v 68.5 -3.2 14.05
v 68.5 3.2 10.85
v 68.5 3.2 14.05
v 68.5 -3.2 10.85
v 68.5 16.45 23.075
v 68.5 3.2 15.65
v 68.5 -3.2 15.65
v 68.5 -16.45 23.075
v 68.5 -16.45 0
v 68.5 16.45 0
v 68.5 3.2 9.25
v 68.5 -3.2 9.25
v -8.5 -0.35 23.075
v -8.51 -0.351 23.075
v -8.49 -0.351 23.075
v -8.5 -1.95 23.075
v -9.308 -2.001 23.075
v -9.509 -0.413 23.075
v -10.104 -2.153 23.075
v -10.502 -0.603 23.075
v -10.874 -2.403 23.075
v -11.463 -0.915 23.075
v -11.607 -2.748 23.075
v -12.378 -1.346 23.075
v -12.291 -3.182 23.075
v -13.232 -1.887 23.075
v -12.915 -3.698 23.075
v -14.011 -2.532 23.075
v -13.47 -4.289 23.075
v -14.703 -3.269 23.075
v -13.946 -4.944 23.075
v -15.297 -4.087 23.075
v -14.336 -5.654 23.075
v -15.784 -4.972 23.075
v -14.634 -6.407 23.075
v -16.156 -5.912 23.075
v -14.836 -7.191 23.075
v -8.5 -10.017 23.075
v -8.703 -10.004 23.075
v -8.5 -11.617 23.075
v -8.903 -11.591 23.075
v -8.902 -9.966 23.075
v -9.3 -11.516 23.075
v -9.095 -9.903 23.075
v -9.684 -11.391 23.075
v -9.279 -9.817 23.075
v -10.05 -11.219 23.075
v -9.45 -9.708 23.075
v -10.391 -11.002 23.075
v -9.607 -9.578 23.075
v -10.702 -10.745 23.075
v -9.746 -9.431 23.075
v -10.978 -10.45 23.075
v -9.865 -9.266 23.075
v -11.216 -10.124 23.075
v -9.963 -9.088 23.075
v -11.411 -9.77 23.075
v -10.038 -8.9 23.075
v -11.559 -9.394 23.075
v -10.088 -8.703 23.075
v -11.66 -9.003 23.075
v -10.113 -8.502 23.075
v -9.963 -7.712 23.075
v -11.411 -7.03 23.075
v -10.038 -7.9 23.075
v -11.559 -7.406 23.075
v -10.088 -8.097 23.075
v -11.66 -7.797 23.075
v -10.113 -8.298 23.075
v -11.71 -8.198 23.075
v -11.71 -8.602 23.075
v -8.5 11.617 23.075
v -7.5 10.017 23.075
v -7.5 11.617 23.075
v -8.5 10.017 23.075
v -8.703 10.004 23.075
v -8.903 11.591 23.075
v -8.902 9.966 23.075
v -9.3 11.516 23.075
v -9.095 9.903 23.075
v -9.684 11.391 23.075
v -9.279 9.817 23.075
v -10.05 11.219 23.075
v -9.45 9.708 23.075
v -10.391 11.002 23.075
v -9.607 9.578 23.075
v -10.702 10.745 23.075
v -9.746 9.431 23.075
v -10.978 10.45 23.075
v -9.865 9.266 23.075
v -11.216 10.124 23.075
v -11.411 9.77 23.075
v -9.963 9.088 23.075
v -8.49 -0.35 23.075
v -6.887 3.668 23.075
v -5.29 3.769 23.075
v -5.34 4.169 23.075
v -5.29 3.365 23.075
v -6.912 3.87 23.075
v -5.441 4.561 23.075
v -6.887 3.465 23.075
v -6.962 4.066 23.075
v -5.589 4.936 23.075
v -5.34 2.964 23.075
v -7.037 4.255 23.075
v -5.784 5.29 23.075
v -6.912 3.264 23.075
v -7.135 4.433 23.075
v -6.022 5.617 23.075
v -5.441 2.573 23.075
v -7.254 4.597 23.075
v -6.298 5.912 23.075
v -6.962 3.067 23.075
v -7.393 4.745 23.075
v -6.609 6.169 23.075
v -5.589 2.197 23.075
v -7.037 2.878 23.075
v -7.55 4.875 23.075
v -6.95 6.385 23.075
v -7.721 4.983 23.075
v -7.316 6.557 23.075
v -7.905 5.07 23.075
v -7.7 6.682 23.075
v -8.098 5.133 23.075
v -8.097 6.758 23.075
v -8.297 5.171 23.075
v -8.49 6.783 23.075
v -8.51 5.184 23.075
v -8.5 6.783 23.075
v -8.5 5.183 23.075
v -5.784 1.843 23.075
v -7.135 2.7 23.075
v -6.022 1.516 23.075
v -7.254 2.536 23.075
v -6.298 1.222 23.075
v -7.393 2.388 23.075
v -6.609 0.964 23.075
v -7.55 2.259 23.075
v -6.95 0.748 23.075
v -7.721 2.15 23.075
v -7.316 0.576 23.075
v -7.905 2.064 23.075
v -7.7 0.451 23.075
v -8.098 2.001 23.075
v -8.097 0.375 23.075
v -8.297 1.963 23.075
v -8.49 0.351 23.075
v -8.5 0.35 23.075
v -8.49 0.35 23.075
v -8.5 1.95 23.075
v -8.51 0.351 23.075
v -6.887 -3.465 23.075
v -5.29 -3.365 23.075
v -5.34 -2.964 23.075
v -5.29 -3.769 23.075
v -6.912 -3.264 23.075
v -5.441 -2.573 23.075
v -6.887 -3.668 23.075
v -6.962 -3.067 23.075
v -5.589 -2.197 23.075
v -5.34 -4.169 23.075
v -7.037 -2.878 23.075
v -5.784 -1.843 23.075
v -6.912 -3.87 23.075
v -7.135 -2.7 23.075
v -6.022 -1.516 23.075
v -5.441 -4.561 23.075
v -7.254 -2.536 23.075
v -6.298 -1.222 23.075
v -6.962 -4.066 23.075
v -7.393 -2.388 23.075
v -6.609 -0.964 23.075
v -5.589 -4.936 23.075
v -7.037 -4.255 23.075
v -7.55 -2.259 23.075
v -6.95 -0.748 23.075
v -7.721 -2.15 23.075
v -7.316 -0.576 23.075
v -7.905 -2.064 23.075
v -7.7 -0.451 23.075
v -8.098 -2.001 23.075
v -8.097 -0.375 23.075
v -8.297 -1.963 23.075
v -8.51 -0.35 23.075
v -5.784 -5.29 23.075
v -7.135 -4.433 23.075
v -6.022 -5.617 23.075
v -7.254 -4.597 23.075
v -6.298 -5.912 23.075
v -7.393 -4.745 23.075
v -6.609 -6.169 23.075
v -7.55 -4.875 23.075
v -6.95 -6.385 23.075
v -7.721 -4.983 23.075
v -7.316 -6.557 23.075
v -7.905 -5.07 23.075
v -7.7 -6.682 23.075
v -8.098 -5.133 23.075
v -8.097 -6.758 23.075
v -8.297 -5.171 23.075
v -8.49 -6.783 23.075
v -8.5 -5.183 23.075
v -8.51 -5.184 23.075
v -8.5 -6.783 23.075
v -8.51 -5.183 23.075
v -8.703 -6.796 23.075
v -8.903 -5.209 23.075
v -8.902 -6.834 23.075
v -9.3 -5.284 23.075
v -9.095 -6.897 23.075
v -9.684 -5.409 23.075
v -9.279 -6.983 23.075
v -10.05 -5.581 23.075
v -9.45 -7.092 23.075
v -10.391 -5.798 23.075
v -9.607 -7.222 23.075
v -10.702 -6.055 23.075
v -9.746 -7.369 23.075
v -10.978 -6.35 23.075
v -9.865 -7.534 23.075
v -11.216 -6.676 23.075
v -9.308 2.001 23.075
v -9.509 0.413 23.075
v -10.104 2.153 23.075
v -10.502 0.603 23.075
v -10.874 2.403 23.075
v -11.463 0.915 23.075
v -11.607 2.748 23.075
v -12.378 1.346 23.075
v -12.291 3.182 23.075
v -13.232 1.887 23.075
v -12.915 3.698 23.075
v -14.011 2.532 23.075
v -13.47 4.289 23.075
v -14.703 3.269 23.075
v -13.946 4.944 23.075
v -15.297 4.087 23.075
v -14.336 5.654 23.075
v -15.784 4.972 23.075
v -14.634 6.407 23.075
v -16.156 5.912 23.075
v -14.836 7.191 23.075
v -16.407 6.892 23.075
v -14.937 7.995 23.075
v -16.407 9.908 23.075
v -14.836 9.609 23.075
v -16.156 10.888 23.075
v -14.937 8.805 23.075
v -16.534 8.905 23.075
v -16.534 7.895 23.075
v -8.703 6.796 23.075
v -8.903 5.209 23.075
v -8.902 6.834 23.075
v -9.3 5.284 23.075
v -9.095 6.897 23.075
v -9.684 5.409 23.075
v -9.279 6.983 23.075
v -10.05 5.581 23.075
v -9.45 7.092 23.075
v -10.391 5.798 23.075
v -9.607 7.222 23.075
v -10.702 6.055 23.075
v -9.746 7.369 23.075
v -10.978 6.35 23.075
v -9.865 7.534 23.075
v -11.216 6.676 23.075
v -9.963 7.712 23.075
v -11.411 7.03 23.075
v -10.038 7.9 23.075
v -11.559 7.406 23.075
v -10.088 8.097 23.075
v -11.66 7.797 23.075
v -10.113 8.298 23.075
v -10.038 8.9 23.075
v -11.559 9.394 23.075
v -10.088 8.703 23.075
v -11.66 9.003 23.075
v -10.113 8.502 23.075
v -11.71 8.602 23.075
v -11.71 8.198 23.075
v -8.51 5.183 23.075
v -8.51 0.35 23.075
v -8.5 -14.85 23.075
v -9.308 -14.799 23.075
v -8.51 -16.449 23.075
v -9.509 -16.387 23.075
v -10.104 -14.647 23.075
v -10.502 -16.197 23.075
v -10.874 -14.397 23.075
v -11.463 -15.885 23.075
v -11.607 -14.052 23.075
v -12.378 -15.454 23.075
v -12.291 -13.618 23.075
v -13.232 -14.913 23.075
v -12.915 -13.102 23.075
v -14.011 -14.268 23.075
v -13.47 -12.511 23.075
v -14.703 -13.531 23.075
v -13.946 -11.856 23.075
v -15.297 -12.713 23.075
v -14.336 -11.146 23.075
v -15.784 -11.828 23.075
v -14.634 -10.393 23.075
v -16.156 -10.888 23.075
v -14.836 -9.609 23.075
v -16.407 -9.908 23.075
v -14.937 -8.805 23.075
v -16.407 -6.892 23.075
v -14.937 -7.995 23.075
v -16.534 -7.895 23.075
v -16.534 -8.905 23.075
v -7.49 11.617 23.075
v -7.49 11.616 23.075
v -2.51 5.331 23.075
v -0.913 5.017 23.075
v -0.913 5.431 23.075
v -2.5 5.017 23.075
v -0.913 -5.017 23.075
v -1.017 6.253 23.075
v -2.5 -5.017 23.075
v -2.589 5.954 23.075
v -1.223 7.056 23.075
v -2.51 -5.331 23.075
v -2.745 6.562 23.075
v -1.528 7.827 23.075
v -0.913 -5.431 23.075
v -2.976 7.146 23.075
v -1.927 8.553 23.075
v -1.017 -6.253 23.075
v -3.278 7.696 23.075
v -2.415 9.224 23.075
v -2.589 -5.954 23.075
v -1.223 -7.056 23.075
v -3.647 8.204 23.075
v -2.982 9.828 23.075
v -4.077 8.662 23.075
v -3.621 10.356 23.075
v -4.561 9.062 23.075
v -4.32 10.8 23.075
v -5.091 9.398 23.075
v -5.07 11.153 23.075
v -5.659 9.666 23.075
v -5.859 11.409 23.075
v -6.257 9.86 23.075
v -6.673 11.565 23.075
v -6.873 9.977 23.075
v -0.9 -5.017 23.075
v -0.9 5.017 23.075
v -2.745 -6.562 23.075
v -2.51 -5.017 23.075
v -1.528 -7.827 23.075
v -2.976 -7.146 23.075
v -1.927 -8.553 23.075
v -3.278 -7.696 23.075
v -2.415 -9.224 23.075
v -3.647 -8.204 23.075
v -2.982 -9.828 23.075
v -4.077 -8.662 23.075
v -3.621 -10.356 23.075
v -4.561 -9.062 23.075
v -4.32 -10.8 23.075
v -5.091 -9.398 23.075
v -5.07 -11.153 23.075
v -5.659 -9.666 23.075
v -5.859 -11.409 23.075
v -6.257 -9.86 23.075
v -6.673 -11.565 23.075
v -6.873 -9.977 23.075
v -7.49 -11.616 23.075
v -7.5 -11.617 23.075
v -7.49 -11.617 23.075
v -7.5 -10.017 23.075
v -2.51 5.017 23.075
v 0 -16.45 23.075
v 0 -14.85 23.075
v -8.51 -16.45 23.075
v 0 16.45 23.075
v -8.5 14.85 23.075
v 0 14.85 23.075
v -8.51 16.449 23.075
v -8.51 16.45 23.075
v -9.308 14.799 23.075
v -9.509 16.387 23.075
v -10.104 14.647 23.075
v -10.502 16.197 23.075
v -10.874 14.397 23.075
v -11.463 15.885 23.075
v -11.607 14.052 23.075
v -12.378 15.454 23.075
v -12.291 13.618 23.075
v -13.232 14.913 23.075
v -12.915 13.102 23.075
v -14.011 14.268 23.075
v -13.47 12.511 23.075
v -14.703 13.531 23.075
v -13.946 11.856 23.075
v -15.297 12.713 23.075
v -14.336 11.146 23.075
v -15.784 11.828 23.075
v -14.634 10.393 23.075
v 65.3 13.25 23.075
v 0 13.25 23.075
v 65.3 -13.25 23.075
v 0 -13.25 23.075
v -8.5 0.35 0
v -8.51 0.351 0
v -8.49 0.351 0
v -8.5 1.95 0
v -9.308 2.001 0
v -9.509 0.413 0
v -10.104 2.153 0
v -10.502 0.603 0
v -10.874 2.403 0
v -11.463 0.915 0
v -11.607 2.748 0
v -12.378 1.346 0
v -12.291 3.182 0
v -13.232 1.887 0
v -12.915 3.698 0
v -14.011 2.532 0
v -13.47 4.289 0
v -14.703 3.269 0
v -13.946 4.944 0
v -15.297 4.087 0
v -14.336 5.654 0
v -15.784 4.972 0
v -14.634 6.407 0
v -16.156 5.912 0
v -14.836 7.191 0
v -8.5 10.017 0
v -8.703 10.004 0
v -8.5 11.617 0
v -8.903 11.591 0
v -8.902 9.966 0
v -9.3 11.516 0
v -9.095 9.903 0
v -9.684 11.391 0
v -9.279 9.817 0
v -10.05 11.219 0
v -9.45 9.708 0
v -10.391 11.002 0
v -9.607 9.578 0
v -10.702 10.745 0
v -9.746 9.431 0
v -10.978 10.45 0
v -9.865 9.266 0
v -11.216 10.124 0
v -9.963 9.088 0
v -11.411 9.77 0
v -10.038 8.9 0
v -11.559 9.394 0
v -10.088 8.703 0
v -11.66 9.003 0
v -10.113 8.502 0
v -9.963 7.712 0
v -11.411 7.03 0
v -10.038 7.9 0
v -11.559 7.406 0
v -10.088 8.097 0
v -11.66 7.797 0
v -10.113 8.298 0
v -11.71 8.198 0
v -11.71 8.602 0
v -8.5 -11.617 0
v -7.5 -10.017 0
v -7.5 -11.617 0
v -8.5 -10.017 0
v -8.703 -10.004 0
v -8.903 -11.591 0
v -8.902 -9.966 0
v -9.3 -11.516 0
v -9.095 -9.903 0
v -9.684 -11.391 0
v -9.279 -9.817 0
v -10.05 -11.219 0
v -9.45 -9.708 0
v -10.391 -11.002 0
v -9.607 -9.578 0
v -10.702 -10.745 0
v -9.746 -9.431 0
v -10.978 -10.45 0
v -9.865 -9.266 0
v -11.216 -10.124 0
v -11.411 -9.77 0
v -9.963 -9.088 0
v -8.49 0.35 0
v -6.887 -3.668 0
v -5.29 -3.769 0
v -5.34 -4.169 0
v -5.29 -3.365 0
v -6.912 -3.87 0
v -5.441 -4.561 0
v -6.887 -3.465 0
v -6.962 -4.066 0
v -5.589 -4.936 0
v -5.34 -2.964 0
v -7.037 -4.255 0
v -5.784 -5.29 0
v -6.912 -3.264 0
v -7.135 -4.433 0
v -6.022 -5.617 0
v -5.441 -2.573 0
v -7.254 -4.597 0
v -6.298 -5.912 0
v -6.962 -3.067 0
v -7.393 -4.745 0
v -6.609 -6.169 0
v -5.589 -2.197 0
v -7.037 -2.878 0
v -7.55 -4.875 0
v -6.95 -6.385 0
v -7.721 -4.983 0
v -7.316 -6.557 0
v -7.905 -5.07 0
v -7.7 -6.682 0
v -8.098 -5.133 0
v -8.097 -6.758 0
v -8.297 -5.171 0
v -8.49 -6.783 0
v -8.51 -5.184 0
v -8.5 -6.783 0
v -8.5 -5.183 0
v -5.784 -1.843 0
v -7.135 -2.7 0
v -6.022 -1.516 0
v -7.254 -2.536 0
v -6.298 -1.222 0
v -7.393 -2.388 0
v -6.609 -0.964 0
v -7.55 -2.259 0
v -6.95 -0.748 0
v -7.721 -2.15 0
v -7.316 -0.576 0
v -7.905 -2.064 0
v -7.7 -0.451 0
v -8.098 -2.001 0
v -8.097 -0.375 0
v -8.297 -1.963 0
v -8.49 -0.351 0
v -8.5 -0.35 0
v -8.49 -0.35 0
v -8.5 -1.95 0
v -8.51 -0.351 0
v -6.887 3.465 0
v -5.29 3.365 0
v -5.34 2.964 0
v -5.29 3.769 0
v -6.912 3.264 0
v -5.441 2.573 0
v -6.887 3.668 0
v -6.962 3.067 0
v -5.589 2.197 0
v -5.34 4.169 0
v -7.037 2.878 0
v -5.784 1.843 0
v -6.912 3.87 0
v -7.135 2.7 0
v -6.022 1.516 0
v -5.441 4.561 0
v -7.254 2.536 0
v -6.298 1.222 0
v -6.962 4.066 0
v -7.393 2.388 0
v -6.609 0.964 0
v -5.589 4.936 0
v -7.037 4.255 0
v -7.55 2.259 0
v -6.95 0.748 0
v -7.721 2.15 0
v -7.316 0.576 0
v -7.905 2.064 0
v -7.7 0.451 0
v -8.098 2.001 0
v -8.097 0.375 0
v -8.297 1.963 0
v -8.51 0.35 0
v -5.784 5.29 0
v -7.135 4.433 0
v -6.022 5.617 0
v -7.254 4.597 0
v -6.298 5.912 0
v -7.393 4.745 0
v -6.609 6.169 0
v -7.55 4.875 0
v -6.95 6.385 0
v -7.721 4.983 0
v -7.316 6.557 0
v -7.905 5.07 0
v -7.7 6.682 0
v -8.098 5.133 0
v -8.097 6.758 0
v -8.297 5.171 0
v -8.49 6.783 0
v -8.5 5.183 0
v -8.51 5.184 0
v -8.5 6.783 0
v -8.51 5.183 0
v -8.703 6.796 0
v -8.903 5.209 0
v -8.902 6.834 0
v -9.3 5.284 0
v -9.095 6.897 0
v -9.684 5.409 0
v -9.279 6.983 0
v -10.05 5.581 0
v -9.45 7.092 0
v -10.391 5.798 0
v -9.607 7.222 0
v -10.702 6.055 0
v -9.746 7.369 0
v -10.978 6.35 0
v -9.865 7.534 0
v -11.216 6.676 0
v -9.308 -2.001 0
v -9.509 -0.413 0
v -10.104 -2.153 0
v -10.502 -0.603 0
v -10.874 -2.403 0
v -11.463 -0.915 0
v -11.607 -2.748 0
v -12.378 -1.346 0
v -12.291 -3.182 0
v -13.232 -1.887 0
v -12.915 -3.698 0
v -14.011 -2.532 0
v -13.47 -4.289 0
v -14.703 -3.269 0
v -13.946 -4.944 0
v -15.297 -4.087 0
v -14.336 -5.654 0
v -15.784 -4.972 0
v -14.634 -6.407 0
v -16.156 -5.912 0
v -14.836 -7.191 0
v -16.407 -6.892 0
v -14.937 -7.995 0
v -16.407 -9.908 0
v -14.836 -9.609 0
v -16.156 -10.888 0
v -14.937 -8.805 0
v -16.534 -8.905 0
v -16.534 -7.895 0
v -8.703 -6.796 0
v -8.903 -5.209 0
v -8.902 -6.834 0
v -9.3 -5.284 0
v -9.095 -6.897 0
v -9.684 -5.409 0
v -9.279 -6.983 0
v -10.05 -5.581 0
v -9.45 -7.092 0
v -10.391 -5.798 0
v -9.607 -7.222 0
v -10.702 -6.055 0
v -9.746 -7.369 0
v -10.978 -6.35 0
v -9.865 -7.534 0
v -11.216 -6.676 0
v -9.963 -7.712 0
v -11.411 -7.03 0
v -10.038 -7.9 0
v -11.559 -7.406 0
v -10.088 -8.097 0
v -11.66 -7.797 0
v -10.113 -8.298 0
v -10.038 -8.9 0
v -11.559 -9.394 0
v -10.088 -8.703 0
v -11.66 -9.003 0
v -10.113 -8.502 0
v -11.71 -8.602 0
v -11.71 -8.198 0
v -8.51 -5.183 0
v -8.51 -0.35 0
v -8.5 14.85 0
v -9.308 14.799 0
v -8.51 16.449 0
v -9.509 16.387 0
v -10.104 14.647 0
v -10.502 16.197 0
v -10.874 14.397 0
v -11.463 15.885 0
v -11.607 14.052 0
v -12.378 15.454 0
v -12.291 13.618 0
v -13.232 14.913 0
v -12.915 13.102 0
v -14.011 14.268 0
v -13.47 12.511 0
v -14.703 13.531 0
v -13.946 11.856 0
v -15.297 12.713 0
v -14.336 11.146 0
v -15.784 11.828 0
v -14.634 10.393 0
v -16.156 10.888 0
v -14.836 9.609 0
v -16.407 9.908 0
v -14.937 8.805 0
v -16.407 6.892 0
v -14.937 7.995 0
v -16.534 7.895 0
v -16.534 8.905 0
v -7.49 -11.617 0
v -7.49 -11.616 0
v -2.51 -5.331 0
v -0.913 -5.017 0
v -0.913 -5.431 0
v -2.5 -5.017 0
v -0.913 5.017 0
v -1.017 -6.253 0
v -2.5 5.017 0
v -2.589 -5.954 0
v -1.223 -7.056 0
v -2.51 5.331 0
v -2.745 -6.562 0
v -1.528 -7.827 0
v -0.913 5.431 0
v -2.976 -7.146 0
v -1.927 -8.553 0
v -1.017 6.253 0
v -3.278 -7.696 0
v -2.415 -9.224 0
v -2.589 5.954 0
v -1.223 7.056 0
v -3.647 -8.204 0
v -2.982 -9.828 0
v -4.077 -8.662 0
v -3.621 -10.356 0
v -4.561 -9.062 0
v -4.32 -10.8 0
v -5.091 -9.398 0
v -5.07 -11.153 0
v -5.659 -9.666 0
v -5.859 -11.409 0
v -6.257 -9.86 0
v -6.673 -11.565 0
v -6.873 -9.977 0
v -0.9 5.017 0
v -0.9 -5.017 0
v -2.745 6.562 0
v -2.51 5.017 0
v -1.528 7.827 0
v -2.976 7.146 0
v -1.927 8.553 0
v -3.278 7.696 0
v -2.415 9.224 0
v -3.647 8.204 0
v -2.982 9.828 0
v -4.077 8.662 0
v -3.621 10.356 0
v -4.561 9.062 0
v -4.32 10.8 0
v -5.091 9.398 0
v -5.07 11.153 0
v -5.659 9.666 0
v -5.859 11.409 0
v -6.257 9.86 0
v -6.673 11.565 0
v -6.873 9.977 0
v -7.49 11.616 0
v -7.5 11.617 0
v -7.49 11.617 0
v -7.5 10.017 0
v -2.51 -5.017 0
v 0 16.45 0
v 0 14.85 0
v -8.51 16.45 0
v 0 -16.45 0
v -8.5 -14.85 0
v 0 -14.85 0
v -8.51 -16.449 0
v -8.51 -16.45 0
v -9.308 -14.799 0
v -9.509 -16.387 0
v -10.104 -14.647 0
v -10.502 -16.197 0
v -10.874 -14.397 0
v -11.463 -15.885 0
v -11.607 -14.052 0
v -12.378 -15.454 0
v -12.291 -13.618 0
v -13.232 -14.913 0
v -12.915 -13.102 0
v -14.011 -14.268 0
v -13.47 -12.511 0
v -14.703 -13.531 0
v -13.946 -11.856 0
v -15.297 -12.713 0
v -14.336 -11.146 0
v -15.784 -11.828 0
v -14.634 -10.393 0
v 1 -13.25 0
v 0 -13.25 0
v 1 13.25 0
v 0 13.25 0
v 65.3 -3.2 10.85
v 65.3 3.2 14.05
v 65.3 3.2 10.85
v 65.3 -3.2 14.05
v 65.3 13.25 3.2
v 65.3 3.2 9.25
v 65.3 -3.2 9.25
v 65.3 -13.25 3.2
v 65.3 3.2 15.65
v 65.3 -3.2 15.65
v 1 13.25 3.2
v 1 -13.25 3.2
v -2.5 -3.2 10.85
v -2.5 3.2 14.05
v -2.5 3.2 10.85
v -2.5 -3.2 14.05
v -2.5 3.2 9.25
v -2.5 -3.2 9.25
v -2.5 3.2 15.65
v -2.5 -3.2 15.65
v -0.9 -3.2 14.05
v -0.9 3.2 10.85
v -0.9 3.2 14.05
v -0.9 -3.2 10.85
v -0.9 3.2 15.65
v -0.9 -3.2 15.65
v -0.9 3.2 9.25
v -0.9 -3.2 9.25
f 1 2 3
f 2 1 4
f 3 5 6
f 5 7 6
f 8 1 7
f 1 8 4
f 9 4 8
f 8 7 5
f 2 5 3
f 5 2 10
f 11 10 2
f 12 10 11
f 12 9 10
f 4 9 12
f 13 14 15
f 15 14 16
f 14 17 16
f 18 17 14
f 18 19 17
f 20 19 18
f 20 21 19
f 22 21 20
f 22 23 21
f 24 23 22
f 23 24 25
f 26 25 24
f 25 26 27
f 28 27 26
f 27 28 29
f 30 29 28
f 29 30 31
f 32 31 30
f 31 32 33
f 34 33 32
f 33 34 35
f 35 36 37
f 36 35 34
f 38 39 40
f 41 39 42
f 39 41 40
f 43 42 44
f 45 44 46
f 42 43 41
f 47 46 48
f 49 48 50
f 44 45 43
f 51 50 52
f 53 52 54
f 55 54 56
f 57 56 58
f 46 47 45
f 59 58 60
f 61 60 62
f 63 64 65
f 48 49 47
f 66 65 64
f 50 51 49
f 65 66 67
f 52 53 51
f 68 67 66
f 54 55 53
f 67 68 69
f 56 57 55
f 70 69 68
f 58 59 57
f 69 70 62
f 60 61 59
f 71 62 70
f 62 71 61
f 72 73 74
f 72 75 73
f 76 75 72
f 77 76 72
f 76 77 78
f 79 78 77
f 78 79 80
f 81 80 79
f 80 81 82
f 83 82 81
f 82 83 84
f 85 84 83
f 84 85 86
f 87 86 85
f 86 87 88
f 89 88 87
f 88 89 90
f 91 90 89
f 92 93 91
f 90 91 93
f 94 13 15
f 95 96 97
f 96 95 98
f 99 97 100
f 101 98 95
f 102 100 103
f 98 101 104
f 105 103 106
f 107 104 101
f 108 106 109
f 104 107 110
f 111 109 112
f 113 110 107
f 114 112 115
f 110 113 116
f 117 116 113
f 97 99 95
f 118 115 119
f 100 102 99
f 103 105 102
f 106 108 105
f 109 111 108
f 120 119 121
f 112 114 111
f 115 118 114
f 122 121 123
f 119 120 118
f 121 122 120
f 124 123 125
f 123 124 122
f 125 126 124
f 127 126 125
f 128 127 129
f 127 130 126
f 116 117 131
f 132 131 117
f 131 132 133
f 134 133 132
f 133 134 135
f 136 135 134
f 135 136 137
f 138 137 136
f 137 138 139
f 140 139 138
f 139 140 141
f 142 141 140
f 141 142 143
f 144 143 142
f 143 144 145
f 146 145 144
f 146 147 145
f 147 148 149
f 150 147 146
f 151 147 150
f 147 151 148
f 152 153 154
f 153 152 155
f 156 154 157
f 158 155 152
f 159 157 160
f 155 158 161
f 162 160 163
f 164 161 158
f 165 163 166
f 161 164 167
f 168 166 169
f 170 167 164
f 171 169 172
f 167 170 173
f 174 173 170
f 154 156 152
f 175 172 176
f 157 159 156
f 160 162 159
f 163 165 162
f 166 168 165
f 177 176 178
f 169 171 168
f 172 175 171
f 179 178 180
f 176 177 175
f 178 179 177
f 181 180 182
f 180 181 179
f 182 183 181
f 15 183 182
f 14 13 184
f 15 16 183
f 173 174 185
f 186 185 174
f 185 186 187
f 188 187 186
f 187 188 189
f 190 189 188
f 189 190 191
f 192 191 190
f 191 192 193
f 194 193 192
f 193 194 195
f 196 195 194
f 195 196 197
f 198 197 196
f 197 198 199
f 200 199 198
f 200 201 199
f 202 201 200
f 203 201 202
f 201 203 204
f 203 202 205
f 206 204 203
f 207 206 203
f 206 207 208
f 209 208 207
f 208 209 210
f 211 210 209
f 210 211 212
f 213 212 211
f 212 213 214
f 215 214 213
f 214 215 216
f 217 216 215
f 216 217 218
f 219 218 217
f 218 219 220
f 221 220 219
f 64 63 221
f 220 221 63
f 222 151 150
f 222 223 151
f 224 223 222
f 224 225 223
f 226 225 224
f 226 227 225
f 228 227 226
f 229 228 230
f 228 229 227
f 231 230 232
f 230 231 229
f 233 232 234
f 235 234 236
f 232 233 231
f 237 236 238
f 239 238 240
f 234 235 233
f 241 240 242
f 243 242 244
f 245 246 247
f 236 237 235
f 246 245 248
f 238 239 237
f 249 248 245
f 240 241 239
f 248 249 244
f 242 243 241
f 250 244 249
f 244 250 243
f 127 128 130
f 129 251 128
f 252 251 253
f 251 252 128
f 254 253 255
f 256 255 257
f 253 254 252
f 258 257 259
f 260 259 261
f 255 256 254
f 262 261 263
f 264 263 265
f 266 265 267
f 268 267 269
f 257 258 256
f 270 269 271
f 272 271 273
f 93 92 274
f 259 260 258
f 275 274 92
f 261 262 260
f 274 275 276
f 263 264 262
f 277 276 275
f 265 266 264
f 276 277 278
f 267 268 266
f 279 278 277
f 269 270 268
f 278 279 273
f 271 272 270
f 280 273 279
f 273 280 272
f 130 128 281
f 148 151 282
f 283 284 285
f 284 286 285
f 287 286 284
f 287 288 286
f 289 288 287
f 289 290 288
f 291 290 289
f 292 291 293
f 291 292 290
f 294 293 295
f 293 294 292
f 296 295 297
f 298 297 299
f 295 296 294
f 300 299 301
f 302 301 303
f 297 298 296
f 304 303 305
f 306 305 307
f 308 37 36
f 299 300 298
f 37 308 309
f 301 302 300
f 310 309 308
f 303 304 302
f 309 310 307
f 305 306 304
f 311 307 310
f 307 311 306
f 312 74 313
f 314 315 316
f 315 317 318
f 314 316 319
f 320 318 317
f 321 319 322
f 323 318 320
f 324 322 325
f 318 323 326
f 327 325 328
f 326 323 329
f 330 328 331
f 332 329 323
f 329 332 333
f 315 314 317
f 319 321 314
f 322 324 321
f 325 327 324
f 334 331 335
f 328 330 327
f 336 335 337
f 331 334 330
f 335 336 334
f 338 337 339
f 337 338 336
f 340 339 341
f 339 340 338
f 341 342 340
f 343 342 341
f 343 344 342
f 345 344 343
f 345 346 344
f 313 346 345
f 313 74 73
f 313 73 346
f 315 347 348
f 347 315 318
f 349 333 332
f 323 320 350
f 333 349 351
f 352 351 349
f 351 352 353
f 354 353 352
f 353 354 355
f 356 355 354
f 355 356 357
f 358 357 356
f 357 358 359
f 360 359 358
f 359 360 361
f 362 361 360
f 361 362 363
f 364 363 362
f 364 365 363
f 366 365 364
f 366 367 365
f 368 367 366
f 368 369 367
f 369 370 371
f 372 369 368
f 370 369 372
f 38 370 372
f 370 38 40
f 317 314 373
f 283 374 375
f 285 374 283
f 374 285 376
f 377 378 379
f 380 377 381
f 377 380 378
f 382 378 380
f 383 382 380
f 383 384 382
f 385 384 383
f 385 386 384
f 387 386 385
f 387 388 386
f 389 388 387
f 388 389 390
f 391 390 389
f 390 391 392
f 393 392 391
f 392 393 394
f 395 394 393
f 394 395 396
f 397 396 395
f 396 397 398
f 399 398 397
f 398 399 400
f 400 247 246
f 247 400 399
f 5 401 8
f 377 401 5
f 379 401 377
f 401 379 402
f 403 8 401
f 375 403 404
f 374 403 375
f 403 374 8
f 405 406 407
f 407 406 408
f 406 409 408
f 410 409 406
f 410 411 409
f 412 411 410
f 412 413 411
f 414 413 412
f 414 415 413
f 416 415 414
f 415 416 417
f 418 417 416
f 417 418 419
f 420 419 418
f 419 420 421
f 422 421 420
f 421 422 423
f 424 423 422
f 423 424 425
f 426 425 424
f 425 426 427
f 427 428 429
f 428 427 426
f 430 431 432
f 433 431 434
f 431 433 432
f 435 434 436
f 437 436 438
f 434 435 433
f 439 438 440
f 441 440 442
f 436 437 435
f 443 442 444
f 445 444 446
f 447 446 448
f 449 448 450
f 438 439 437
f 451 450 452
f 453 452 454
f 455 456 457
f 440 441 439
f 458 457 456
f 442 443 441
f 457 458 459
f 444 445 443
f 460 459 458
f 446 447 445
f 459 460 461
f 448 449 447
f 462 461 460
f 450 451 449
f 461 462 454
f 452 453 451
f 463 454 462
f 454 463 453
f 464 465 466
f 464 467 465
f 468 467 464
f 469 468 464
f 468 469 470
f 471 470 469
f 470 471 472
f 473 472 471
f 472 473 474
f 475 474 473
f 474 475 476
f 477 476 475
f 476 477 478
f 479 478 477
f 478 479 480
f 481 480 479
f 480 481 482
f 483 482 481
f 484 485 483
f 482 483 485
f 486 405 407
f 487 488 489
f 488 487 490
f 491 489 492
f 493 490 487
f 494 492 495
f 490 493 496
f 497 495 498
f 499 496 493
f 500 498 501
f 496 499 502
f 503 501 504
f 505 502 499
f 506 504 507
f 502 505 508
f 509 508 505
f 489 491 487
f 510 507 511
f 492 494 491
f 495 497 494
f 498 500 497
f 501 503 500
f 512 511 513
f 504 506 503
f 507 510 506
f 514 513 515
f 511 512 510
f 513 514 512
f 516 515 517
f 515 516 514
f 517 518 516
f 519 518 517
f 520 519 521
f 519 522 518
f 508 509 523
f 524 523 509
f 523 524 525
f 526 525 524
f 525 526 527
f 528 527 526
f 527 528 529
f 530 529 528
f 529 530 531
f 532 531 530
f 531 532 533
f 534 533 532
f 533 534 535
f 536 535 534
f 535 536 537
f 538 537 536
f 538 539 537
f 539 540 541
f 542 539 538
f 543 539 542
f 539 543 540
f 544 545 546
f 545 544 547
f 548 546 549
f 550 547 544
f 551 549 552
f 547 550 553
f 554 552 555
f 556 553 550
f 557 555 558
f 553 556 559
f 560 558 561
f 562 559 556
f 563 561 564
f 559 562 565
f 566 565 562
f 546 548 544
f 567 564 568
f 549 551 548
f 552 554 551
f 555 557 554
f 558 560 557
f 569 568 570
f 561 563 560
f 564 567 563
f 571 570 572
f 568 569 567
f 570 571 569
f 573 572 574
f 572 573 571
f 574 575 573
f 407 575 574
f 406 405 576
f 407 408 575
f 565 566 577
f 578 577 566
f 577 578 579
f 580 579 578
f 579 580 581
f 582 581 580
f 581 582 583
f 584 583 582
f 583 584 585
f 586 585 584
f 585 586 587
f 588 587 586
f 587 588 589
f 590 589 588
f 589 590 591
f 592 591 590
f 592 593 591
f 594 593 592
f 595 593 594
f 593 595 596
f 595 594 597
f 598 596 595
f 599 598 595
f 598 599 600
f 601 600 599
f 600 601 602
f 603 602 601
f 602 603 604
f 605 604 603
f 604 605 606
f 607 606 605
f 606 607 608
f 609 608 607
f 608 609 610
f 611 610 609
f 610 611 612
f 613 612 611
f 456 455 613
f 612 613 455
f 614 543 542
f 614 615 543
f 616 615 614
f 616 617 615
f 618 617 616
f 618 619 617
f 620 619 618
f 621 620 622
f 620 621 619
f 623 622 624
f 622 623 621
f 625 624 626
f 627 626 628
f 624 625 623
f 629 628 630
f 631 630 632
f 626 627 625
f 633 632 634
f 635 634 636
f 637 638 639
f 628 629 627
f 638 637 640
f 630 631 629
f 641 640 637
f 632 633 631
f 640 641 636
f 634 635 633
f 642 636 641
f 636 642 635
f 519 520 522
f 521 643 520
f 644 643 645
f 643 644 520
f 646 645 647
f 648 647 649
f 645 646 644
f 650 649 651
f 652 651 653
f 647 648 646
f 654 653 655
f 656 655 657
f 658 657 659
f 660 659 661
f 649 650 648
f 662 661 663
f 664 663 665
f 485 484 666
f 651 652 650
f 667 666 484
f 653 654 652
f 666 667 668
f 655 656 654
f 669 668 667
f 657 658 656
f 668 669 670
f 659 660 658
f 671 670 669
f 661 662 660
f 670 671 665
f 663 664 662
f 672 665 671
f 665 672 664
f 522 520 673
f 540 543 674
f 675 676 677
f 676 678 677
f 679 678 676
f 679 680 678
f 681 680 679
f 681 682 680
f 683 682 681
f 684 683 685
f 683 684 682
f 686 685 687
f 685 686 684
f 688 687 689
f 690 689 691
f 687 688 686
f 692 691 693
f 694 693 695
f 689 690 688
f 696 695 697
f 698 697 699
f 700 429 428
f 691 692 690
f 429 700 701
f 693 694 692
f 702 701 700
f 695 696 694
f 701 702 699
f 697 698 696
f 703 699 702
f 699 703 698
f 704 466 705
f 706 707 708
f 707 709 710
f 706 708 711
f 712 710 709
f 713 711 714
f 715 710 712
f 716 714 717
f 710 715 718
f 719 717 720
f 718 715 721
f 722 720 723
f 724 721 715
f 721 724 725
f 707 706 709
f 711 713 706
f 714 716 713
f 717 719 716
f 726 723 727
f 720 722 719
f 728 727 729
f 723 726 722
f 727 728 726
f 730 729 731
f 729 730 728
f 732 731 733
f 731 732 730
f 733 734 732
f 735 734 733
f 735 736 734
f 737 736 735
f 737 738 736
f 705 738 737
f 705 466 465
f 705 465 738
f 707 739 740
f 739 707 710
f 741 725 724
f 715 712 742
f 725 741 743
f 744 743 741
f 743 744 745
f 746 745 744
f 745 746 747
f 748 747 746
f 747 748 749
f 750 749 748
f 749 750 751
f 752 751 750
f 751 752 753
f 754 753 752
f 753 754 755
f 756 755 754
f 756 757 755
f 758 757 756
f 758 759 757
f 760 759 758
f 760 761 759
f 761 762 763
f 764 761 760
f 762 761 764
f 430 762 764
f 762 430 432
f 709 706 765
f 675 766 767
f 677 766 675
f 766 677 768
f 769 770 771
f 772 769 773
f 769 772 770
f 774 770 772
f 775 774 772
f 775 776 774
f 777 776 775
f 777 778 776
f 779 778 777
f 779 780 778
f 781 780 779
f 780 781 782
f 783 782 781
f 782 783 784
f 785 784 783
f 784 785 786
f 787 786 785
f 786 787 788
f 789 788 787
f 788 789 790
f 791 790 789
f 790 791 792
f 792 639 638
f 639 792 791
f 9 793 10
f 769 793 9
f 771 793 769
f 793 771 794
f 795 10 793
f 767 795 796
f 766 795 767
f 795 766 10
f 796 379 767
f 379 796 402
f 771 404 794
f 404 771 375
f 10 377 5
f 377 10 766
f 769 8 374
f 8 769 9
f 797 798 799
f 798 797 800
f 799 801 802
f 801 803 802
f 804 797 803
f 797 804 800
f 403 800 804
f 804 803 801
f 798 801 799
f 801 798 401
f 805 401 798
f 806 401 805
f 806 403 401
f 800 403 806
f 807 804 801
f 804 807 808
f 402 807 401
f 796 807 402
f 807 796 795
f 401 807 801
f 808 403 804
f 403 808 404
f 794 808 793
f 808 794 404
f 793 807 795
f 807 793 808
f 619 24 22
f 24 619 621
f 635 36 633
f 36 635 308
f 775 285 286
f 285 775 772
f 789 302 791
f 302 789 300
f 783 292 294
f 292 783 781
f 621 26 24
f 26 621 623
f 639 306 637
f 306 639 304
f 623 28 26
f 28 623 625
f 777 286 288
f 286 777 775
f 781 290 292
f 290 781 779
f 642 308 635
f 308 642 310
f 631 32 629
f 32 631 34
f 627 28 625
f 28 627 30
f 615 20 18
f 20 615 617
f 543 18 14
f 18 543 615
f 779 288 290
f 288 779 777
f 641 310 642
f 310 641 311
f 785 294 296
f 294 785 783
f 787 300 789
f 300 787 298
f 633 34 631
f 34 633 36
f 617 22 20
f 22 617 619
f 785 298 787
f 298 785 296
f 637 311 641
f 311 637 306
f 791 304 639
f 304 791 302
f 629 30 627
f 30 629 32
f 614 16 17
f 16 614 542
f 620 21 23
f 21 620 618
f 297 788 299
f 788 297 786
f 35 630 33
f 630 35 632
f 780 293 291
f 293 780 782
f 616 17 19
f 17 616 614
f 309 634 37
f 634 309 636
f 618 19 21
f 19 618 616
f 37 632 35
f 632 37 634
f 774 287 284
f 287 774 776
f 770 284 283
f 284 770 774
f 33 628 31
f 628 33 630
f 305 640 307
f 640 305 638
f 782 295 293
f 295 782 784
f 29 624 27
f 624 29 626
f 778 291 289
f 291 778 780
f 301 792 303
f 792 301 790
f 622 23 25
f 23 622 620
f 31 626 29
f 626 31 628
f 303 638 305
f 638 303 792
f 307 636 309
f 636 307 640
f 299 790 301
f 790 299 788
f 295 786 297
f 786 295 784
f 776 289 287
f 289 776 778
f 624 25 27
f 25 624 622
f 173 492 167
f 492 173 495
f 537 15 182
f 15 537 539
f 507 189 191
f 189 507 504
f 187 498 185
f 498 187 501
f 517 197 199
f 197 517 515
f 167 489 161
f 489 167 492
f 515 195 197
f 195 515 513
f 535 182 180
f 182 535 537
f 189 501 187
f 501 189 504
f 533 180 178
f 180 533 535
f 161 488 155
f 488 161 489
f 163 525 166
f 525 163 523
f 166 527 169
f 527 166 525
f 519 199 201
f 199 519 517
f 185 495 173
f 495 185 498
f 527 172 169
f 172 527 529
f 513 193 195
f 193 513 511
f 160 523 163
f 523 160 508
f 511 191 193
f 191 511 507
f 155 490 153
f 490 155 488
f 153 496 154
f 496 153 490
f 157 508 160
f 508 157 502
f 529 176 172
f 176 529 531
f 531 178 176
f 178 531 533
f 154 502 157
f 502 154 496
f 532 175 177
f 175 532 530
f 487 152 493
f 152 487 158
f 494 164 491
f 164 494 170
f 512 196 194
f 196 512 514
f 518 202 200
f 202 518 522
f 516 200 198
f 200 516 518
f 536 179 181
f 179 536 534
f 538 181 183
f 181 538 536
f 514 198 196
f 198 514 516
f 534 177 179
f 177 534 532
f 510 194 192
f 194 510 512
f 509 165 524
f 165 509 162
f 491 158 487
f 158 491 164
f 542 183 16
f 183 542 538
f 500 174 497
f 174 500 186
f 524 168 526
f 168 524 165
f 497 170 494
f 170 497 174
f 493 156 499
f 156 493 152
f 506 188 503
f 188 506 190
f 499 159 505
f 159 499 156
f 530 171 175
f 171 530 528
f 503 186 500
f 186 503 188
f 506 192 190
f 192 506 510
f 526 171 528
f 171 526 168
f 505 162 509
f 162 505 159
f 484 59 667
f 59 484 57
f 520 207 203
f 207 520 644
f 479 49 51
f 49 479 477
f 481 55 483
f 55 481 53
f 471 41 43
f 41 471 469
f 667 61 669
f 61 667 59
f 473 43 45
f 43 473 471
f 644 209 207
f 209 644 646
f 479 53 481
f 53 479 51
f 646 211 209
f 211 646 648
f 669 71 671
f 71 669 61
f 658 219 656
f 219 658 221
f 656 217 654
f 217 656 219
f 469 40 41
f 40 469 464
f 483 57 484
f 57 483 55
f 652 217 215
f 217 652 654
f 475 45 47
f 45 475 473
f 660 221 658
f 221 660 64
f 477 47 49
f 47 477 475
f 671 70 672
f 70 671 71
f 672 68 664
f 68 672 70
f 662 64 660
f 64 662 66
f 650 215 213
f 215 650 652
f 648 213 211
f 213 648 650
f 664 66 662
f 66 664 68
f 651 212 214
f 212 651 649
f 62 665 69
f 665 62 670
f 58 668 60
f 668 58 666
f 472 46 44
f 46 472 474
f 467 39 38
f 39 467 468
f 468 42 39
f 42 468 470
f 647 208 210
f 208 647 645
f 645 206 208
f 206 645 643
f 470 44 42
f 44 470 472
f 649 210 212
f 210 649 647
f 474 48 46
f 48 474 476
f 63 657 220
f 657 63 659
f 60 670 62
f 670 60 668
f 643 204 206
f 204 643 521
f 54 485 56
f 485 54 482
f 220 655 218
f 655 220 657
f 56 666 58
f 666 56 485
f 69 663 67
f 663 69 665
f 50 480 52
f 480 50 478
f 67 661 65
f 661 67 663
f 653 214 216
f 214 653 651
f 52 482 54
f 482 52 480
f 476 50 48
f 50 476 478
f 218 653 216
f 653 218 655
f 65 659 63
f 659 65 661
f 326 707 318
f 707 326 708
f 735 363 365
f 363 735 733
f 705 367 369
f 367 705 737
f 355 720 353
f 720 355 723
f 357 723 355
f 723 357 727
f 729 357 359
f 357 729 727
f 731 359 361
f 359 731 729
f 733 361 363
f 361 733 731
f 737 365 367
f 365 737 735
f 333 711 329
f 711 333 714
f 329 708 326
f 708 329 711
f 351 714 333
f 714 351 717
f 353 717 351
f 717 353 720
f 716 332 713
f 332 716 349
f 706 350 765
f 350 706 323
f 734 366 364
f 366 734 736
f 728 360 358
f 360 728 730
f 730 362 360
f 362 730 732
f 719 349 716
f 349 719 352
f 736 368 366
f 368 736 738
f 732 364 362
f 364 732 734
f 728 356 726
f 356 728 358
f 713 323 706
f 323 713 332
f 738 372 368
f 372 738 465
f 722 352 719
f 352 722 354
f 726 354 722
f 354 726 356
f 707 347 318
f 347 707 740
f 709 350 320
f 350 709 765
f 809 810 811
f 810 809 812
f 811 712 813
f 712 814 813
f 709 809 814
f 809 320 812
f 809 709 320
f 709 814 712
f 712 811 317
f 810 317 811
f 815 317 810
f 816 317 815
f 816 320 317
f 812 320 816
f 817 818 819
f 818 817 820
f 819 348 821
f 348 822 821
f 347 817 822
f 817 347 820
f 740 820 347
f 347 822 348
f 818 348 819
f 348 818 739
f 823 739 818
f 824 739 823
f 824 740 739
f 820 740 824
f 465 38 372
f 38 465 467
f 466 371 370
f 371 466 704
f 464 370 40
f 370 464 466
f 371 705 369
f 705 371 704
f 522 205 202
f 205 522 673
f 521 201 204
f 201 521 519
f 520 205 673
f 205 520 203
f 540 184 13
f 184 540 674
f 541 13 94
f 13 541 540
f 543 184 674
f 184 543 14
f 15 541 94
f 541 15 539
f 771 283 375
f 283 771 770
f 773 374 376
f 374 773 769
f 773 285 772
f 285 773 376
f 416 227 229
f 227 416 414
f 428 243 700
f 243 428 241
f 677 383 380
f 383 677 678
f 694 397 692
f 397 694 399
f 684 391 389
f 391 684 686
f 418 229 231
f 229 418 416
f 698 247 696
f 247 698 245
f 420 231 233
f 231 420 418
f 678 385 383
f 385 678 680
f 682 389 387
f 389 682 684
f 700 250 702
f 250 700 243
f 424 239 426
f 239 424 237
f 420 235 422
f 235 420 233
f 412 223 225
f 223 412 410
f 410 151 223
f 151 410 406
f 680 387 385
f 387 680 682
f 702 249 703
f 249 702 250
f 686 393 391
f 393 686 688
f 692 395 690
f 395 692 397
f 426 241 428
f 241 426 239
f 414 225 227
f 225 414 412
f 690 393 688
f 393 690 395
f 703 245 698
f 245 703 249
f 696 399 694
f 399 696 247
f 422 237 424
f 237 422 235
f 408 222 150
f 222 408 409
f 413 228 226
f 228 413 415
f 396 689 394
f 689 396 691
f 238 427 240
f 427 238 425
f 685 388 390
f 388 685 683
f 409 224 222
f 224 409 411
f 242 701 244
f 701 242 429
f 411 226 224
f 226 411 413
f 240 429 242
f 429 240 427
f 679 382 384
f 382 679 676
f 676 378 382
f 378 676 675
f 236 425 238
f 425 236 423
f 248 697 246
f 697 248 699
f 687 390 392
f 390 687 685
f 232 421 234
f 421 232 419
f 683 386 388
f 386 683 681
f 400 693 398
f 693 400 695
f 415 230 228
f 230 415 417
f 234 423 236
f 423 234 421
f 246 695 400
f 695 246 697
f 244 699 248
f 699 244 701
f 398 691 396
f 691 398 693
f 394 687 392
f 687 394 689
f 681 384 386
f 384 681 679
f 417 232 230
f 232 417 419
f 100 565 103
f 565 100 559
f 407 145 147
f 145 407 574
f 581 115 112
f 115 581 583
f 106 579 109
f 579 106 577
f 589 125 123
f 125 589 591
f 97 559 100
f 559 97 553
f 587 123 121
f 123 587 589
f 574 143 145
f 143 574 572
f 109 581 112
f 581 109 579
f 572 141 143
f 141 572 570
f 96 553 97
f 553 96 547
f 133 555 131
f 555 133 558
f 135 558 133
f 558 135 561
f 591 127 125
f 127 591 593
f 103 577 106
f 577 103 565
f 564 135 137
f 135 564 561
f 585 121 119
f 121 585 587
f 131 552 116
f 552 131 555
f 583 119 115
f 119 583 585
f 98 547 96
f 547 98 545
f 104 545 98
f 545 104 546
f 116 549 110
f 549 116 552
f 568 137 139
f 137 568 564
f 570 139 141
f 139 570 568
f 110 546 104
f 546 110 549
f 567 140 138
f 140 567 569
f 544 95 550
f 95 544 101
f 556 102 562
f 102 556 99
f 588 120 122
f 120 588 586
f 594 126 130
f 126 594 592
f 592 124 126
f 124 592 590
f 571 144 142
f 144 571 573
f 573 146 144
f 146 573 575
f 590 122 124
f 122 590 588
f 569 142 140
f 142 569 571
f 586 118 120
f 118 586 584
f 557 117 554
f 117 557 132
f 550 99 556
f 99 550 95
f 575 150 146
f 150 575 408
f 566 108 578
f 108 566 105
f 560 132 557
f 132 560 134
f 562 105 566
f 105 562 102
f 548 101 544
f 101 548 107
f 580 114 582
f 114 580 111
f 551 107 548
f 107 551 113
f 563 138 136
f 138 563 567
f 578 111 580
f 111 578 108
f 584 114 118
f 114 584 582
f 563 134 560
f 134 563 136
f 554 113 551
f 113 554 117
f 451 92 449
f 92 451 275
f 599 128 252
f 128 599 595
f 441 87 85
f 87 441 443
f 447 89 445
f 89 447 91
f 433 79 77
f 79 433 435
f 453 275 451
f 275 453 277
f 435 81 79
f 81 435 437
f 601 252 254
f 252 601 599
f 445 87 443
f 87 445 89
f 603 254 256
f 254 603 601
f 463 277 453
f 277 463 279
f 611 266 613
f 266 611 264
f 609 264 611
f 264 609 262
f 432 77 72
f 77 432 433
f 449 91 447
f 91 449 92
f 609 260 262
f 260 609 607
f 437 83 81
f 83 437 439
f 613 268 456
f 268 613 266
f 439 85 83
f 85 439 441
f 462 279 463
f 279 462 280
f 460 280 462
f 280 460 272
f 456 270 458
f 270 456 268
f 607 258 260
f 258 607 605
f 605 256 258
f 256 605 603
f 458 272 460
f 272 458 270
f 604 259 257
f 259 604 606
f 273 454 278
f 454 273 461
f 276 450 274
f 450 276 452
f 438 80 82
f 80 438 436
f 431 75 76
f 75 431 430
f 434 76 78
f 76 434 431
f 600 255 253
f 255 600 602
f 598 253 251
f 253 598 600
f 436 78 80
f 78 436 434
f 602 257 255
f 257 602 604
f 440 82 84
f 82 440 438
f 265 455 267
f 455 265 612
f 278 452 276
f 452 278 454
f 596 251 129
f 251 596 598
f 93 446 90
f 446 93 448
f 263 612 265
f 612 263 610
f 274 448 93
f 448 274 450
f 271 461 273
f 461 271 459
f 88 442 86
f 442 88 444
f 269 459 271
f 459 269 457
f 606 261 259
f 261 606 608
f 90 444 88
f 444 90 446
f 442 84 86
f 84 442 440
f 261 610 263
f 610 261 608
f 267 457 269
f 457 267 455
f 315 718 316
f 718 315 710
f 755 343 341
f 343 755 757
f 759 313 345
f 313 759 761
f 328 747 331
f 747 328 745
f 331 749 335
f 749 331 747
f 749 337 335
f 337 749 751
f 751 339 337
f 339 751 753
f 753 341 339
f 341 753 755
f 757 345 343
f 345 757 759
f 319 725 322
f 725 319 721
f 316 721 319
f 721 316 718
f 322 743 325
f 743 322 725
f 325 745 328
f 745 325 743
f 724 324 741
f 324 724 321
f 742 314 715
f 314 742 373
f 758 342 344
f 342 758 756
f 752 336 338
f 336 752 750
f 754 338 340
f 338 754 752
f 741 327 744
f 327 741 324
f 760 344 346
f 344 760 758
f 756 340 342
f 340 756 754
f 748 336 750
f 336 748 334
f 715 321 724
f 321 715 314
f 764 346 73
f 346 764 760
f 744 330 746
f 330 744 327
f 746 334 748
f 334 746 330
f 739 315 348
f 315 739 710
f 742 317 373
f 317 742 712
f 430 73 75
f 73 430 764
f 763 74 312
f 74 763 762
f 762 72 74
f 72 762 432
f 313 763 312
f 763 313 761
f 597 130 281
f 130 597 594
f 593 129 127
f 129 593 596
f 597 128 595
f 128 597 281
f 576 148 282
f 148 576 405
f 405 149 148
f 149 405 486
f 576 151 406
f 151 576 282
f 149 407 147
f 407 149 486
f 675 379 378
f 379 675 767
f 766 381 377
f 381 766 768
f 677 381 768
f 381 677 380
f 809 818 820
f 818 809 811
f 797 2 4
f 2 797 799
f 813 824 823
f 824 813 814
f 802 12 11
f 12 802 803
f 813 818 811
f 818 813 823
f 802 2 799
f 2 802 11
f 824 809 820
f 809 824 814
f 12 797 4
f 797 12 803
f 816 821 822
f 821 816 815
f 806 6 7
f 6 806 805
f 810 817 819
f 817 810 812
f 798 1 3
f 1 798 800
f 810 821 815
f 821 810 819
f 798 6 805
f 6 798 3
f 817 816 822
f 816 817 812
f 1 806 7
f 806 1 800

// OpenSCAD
//////////////////////////////////////////////////////////////////////////////////////
///
///  FLEXBATTER: Flexing battery holder with built-in spring
///
///  This file generates battery holders for arbitrary cylindrical sizes.
///  The number of batteries and their size is fully parametrized.
///
///  The usual metallic spring at the minus pole is replaced by a
///  flexible printed spring, which is pressing the contacts firmly to 
///  the battery.
///
///  The contacts for the plus and minus pole can easily be made by
///  a few windings of the uninsulated ends of the connecting wires.
///  Each battery compartment contains are several holes to the outside
///  as well ad to the neighboring compartments, through which connecting
///  wires can be passed for easy configuring of parallel, serial or
///  balanced-serial battery packs.
///  
///  The preconfigured battery sizes are:
///  AA, AAA, C, D, 18650(Li-Ion), 18650P(protected Li-Ion), CR123A(16340)
///  
///  Given that the printed plastic spring needs to be flexible, ABS is the material
///  of choice here.
///
//////////////////////////////////////////////////////////////////////////////////////
///
///  2014-09-09 Heinz Spiess, Switzerland
///
///  released under Creative Commons - Attribution - Share Alike licence (CC BY-SA)
//////////////////////////////////////////////////////////////////////////////////////

// build a cube with chamfered edges
module chamfered_cube(size,d=1){
   hull(){
     translate([d,d,0])cube(size-2*[d,d,0]);
     translate([0,d,d])cube(size-2*[0,d,d]);
     translate([d,0,d])cube(size-2*[d,0,d]);
   }
}


// draw an arc width height h between radius r1..r2 and angles a1..a2
module arc(r1,r2,h,a1=0,a2=0){
     if(a2-a1<=180){
        difference(){
           cylinder(r=r2,h=h);
           translate([0,0,-1])cylinder(r=r1,h=h+2);
	   rotate(a2)translate([-r1-r2,0,-1])cube([2*(r1+r2),2*(r1+r2),h+2]);
	   rotate(a1+180)translate([-r1-r2,0,-1])cube([2*(r1+r2),2*(r1+r2),h+2]);
        }
     } else {
           difference(){
              cylinder(r=r2,h=h);
              translate([0,0,-1])cylinder(r=r1,h=h+2);
              intersection(){
	       rotate(a2)translate([-r1-r2,0,-1])cube([2*(r1+r2),2*(r1+r2),h+2]);
	       rotate(a1+180)translate([-r1-r2,0,-1])cube([2*(r1+r2),2*(r1+r2),h+2]);
	      }
           }
     }
}

/////////////////////////////////////////////////////////////////////////////////
// sline - generate a "snake line" of width w and height h 
// with a arbitrary sequence of segments defined by a radius and a turning angle
//
//   angle[i] > 0  left turn / counter-clockwise
//   angle[i] < 0  left turn / clockwise
//   angle[i] = 0  straight segment with length radius[i]
//
/////////////////////////////////////////////////////////////////////////////////
// Heinz Spiess, 2014-09-06 (CC BY-SA)
/////////////////////////////////////////////////////////////////////////////////
module sline(angle,radius,i,w,h){
   scale([angle[i]>=0?1:-1,1,1]){
      r=abs(radius[i]);
    a=angle[i];
         translate([a?r:0,0,0]){
            translate([-w/2,-r-0.01,0])cube([w,0.02,h]); // tiny overlap!
                if(a)arc(r-w/2,r+w/2,0,a,h=h);
            else if(r>0)translate([-w/2,-r,0])cube([w,r,h]);
          if(i+1<len(angle))
               rotate(angle[i])
              translate([a?-r:0,a?0:-r,0])
                 sline(angle,radius,i+1,w,h);
      }
  }
}

//////////////////////////////////////////////////////////////////////////////////
//
//  FLEXBATTER:  Flexing battery holder with integrated plastic spring
//
//////////////////////////////////////////////////////////////////////////////////
module flexbatter(n=1,l=65,d=18,hf=0.75,r=4,shd=3,eps=0.28,el=0,ew=0.56, xchan=[1/4,3/4],bulges=true,symbols=true,wire_channel=true,chamfer=true, $fn=50){
//ew=0.56;   // extrusion width
eh=0.25;   // extrusion height
w = 4*ew;  // case wall thickness
ws = 2*ew; // spring wall thickness
ch = w-ws; // edge chamfering
deepen=0; //deepening for side grip of batteries
//el = 0;  // extra length in spring
//eps = 0.28;
//shd = 3; // screw hole diameter
//hf=0.75;
//xchan=[1/4,3/4]; // relative position of traversal wire channels

r = d/5+2*ws; // linear spring length (depends on sline() call!)

   for(i=[0:n-1])translate([0,i*(d+w+ws),0]){ // generate n battery cases
      difference(){
         
         union(){
            difference(){
               // main body
               translate([0,-w-d/2,0]){
                   if(chamfer){
                        chamfered_cube([l+w,d+2*w+(i<n-1?ws:0),hf*d+w+ch],ch);
                   } else {
                       cube([l+w,d+2*w+(i<n-1?ws:0),hf*d+w]);
                   }
               }
	       // main cavity
               translate([-2,-d/2,w])cube([2+l,d,d+1]);
	       // cavity for locating plastic spring
               translate([-1,-d/2,-1])cube([2,d,d+w+2]);
	       // small cylindrical carving of walls and bottom
	       if(eps>0)translate([-1,0,d/2+w])rotate([0,90,0])cylinder(r=d/2+eps,h=l+1);
            }
      
            // plastic spring for minus pole
            for(sy=[-1,1])scale([1,sy,1]){
                D=d+2*w-2*ws-0.7;
               translate([ch,d/2+w-ws/2,0])rotate(-90)
		  //sline([90,0,120,90,120,90,0],[d/8+2,d/6,d/8-1,d/8,-d/8,d/8,d/2],0,ws,hf*d+w);
		  sline([0,180,0,180,0,-180,0,90,0],[r+ch+el,D/4,el,D/12,el/2,D/12,1+el/2,D/5,D/3],0,ws,hf*d+w);


            }
         }
      
         // lower and upper holes for contacts
         for(z=[-4*ws,-ws])
            translate([-2*ws,-w,w-ws/2+d/2+z])
         cube([l+2*w+2,2*w,ws]);
         
         if(wire_channel){
            // longitudinal bottom wire channel
            translate([-2*ws,0,0])rotate([0,90,0])cylinder(r=w/2,h=l+w+2+r,$fn=5);
         
      
             // traversal bottom wire channels
             for(x=l*xchan)translate([x,-d/2-w-1,eh]) rotate([-90,0,0])cylinder(r=w/2,h=d+2*w+ws+2,$fn=6);
         }
         // grip deepening
	 if(deepen>0)
            translate([w+l/2-0.5,-d/2-w-0.01,w+d+l])
	       rotate([-90,0,0]){
	          cylinder(r=l+deepen*d,h=d+2*w+2*ws+2,$fn=72);
	          if(i==0)cylinder(r1=l+deepen*d+ch,r2=l+deepen*d,h=ch+0.02,$fn=72);
	          if(i==n-1)translate([0,0,d+2*w-ch])cylinder(r2=l+deepen*d+ch,r1=l+deepen*d,h=ch+0.02,$fn=72);

               }
         // conical screw holes in corners
         for(x=[7+shd,l-2*shd])for(y=[-d/2+shd,d/2-shd])
             translate([x,y,-1]){
                cylinder(r=shd/2,h=w+2);
                translate([0,0,w-shd/2+1])cylinder(r1=shd/2,r2=shd,h=shd/2+0.01);
             }

         if(wire_channel){
             // holes for wires passing inside
             for(sy=[-1,1])scale([1,sy,1]){
            translate([l-1,-d/2,w])cube([w+2,2,2]);
                for(x=[3,l-7])translate([x,-d/2-w-ws-1,w])cube([3,w+ws+3,2]); 
                translate([3,-d/2+w/2-0.75,-1])cube([3,1.5,w+2]); 
                translate([-0.5,-d/2+w/2,0])rotate([0,90,0])cylinder(r=w/2,h=6.5,$fn=5);
             }
         }

         // engrave battery symbol
     if(symbols){
         translate([w+l/2,d/4+1,w])cube([l/5,d/4.5,4*eh],true);
         translate([w+l/2+l/10,d/4+1,w])cube([d/7,d/10,4*eh],true);
         // engrave plus symbol
         if(l>12*shd){ sy = 1; }
         else { sy = -1; }
         // for short batteries +- on the side
        translate([w+l/2+l/(sy>0?5:10),sy*(d/4+1),w]){
           cube([1,d/4,4*eh],true);
           cube([d/4,1,4*eh],true);
            }
     // engrave minus symbol
        translate([w+l/2-l/(sy>0?5:10),sy*(d/4+1),w])
           cube([1,d/4,4*eh],true);
     }
   
         //correction for middle separators
         //if(i<n-1) translate([-d,d/2+w-ws/2,-1])cube([d,ws/2+0.1,d+2]);
	 //else translate([1,d/2+w,-0.01])cylinder(r1=ch,r2=0,h=ch);
         //if(i>0) translate([-d,-d/2-w-0.1,-1])cube([d,ws/2+0.1,d+2]);
	 //else translate([1,-d/2-w,-0.01])cylinder(r1=ch,r2=0,h=ch);


      }


    if(bulges){
      // horizontal contact bulges (+ and - pole)
      for(x=[-0.3,l])
         hull()for(y=[-3+el,3-el])
            translate([x,y,w+d/2])
                sphere(r=ws);
   
      // vertical contact bulge (+ pole only)
      if(0)hull()for(z=[-3+el,3-el])for(x=[0,w-ws])
            translate([l+x,0,w+d/2+z])sphere(r=ws);
  }



   }

}

module flexbatter18650(n=1){
   flexbatter(n=n,l=65.5,d=18.4,hf=0.75,shd=3,eps=0.28);
}  

module flexbatter18650P(n=1){
   flexbatter(n=n,l=67.5,d=18.4,hf=0.75,shd=3,eps=0.28);
}  

module flexbatter26650(n=1,ew=0.56){
    flexbatter(n=n,ew=ew,l=65.5,d=26.4,hf=0.75,shd=3,eps=0.28);
}

module flexbatter26650P(n=1){
    flexbatter(n=n,l=67.5,d=26.4,hf=0.75,shd=3,eps=0.28);
}

module flexbatter32650(n=1){
   flexbatter(n=n,l=65.5,d=32.4,hf=0.75,shd=3,eps=0.28);
}  

module flexbatter32650P(n=1){
   flexbatter(n=n,l=67.5,d=32.4,hf=0.75,shd=3,eps=0.28);
}  

module flexbatterCR123A(n=1){
   flexbatter(n=n,l=35.1,d=16.7,hf=0.75,shd=3,xchan=[0.5],eps=0.28);
}  

module flexbatterD(n=1){
   flexbatter(n=n,l=61.5,d=34.0,hf=0.75,shd=3,eps=0.28);
}  

module flexbatterC(n=1){
   flexbatter(n=n,l=51.6,d=26.4,hf=0.75,shd=3,eps=0.28);
}  

module flexbatterAA(n=1){
   flexbatter(n=n,l=51.6,d=14.4,hf=0.80,shd=2.5,el=0.5,eps=0.28);
}  

module flexbatterAAA(n=1){
   flexbatter(n=n,l=46.1,d=10.45,hf=0.84,shd=2,el=1,xchan=[0.5],eps=0);
}  
/*
module flexbatter18650x1(){ // AUTO_MAKE_STL
  flexbatter18650(n=1);
}

module flexbatter18650Px1(){ // AUTO_MAKE_STL
  flexbatter18650P(n=1);
}

module flexbatterCR123Ax1(){ // AUTO_MAKE_STL
  flexbatterCR123A(n=1);
}

module flexbatterAAx1(){ // AUTO_MAKE_STL
  flexbatterAA(n=1);
}

module flexbatterAAAx1(){ // AUTO_MAKE_STL
  flexbatterAAA(n=1);
}

module flexbatterCx1(){ // AUTO_MAKE_STL
  flexbatterC(n=1);
}

module flexbatter18650x2(){ // AUTO_MAKE_STL
  flexbatter18650(n=2);
}

module flexbatterAAx2(){ // AUTO_MAKE_STL
  flexbatterAA(n=2);
}

module flexbatterAAAx2(){ // AUTO_MAKE_STL
  flexbatterAAA(n=2);
}

module flexbatterCx2(){ // AUTO_MAKE_STL
  flexbatterC(n=2);
}

module flexbatter18650x3(){ // AUTO_MAKE_STL
  flexbatter18650(n=3);
}

module flexbatterAAx3(){ // AUTO_MAKE_STL
  flexbatterAA(n=3);
}

module flexbatterAAAx3(){ // AUTO_MAKE_STL
  flexbatterAAA(n=3);
}

module flexbatter18650x4(){ // AUTO_MAKE_STL
  flexbatter18650(n=4);
}

module flexbatterAAx4(){ // AUTO_MAKE_STL
  flexbatterAA(n=4);
}

module flexbatterAAAx4(){ // AUTO_MAKE_STL
  flexbatterAAA(n=4);
}
*/

//flexbatter32650(n=1);
flexbatter(n=1,ew=0.8,l=65.3,d=26.5,hf=0.75,shd=0,eps=0, bulges=false, symbols=false, wire_channel=false, chamfer=false);
//flexbatter18650(n=1);

// uncomment as needed:

//flexbatterCR123A(n=2);
//rotate([0,0,0])translate([0,0,-9])flexbatter18650(n=1);
//translate([0,40,0])rotate([90,0,0])translate([0,0,-9])flexbatter18650(n=1);
//translate([0,80,0])rotate([180,0,0])translate([0,0,-9])flexbatter18650(n=1);
//translate([0,120,0])rotate([-90,0,0])translate([0,0,-9])flexbatter18650(n=1);
//translate([0,33,0])flexbatter18650(n=2);
//translate([0,90,0])flexbatter18650(n=3);
//translate([-90,33,0])flexbatter18650(n=4);
//translate([0,28,0])flexbatterAA(n=1);
//translate([0,50,0])flexbatterAAA(n=1);
//flexbatterC(n=1);
//flexbatterD(n=1);
